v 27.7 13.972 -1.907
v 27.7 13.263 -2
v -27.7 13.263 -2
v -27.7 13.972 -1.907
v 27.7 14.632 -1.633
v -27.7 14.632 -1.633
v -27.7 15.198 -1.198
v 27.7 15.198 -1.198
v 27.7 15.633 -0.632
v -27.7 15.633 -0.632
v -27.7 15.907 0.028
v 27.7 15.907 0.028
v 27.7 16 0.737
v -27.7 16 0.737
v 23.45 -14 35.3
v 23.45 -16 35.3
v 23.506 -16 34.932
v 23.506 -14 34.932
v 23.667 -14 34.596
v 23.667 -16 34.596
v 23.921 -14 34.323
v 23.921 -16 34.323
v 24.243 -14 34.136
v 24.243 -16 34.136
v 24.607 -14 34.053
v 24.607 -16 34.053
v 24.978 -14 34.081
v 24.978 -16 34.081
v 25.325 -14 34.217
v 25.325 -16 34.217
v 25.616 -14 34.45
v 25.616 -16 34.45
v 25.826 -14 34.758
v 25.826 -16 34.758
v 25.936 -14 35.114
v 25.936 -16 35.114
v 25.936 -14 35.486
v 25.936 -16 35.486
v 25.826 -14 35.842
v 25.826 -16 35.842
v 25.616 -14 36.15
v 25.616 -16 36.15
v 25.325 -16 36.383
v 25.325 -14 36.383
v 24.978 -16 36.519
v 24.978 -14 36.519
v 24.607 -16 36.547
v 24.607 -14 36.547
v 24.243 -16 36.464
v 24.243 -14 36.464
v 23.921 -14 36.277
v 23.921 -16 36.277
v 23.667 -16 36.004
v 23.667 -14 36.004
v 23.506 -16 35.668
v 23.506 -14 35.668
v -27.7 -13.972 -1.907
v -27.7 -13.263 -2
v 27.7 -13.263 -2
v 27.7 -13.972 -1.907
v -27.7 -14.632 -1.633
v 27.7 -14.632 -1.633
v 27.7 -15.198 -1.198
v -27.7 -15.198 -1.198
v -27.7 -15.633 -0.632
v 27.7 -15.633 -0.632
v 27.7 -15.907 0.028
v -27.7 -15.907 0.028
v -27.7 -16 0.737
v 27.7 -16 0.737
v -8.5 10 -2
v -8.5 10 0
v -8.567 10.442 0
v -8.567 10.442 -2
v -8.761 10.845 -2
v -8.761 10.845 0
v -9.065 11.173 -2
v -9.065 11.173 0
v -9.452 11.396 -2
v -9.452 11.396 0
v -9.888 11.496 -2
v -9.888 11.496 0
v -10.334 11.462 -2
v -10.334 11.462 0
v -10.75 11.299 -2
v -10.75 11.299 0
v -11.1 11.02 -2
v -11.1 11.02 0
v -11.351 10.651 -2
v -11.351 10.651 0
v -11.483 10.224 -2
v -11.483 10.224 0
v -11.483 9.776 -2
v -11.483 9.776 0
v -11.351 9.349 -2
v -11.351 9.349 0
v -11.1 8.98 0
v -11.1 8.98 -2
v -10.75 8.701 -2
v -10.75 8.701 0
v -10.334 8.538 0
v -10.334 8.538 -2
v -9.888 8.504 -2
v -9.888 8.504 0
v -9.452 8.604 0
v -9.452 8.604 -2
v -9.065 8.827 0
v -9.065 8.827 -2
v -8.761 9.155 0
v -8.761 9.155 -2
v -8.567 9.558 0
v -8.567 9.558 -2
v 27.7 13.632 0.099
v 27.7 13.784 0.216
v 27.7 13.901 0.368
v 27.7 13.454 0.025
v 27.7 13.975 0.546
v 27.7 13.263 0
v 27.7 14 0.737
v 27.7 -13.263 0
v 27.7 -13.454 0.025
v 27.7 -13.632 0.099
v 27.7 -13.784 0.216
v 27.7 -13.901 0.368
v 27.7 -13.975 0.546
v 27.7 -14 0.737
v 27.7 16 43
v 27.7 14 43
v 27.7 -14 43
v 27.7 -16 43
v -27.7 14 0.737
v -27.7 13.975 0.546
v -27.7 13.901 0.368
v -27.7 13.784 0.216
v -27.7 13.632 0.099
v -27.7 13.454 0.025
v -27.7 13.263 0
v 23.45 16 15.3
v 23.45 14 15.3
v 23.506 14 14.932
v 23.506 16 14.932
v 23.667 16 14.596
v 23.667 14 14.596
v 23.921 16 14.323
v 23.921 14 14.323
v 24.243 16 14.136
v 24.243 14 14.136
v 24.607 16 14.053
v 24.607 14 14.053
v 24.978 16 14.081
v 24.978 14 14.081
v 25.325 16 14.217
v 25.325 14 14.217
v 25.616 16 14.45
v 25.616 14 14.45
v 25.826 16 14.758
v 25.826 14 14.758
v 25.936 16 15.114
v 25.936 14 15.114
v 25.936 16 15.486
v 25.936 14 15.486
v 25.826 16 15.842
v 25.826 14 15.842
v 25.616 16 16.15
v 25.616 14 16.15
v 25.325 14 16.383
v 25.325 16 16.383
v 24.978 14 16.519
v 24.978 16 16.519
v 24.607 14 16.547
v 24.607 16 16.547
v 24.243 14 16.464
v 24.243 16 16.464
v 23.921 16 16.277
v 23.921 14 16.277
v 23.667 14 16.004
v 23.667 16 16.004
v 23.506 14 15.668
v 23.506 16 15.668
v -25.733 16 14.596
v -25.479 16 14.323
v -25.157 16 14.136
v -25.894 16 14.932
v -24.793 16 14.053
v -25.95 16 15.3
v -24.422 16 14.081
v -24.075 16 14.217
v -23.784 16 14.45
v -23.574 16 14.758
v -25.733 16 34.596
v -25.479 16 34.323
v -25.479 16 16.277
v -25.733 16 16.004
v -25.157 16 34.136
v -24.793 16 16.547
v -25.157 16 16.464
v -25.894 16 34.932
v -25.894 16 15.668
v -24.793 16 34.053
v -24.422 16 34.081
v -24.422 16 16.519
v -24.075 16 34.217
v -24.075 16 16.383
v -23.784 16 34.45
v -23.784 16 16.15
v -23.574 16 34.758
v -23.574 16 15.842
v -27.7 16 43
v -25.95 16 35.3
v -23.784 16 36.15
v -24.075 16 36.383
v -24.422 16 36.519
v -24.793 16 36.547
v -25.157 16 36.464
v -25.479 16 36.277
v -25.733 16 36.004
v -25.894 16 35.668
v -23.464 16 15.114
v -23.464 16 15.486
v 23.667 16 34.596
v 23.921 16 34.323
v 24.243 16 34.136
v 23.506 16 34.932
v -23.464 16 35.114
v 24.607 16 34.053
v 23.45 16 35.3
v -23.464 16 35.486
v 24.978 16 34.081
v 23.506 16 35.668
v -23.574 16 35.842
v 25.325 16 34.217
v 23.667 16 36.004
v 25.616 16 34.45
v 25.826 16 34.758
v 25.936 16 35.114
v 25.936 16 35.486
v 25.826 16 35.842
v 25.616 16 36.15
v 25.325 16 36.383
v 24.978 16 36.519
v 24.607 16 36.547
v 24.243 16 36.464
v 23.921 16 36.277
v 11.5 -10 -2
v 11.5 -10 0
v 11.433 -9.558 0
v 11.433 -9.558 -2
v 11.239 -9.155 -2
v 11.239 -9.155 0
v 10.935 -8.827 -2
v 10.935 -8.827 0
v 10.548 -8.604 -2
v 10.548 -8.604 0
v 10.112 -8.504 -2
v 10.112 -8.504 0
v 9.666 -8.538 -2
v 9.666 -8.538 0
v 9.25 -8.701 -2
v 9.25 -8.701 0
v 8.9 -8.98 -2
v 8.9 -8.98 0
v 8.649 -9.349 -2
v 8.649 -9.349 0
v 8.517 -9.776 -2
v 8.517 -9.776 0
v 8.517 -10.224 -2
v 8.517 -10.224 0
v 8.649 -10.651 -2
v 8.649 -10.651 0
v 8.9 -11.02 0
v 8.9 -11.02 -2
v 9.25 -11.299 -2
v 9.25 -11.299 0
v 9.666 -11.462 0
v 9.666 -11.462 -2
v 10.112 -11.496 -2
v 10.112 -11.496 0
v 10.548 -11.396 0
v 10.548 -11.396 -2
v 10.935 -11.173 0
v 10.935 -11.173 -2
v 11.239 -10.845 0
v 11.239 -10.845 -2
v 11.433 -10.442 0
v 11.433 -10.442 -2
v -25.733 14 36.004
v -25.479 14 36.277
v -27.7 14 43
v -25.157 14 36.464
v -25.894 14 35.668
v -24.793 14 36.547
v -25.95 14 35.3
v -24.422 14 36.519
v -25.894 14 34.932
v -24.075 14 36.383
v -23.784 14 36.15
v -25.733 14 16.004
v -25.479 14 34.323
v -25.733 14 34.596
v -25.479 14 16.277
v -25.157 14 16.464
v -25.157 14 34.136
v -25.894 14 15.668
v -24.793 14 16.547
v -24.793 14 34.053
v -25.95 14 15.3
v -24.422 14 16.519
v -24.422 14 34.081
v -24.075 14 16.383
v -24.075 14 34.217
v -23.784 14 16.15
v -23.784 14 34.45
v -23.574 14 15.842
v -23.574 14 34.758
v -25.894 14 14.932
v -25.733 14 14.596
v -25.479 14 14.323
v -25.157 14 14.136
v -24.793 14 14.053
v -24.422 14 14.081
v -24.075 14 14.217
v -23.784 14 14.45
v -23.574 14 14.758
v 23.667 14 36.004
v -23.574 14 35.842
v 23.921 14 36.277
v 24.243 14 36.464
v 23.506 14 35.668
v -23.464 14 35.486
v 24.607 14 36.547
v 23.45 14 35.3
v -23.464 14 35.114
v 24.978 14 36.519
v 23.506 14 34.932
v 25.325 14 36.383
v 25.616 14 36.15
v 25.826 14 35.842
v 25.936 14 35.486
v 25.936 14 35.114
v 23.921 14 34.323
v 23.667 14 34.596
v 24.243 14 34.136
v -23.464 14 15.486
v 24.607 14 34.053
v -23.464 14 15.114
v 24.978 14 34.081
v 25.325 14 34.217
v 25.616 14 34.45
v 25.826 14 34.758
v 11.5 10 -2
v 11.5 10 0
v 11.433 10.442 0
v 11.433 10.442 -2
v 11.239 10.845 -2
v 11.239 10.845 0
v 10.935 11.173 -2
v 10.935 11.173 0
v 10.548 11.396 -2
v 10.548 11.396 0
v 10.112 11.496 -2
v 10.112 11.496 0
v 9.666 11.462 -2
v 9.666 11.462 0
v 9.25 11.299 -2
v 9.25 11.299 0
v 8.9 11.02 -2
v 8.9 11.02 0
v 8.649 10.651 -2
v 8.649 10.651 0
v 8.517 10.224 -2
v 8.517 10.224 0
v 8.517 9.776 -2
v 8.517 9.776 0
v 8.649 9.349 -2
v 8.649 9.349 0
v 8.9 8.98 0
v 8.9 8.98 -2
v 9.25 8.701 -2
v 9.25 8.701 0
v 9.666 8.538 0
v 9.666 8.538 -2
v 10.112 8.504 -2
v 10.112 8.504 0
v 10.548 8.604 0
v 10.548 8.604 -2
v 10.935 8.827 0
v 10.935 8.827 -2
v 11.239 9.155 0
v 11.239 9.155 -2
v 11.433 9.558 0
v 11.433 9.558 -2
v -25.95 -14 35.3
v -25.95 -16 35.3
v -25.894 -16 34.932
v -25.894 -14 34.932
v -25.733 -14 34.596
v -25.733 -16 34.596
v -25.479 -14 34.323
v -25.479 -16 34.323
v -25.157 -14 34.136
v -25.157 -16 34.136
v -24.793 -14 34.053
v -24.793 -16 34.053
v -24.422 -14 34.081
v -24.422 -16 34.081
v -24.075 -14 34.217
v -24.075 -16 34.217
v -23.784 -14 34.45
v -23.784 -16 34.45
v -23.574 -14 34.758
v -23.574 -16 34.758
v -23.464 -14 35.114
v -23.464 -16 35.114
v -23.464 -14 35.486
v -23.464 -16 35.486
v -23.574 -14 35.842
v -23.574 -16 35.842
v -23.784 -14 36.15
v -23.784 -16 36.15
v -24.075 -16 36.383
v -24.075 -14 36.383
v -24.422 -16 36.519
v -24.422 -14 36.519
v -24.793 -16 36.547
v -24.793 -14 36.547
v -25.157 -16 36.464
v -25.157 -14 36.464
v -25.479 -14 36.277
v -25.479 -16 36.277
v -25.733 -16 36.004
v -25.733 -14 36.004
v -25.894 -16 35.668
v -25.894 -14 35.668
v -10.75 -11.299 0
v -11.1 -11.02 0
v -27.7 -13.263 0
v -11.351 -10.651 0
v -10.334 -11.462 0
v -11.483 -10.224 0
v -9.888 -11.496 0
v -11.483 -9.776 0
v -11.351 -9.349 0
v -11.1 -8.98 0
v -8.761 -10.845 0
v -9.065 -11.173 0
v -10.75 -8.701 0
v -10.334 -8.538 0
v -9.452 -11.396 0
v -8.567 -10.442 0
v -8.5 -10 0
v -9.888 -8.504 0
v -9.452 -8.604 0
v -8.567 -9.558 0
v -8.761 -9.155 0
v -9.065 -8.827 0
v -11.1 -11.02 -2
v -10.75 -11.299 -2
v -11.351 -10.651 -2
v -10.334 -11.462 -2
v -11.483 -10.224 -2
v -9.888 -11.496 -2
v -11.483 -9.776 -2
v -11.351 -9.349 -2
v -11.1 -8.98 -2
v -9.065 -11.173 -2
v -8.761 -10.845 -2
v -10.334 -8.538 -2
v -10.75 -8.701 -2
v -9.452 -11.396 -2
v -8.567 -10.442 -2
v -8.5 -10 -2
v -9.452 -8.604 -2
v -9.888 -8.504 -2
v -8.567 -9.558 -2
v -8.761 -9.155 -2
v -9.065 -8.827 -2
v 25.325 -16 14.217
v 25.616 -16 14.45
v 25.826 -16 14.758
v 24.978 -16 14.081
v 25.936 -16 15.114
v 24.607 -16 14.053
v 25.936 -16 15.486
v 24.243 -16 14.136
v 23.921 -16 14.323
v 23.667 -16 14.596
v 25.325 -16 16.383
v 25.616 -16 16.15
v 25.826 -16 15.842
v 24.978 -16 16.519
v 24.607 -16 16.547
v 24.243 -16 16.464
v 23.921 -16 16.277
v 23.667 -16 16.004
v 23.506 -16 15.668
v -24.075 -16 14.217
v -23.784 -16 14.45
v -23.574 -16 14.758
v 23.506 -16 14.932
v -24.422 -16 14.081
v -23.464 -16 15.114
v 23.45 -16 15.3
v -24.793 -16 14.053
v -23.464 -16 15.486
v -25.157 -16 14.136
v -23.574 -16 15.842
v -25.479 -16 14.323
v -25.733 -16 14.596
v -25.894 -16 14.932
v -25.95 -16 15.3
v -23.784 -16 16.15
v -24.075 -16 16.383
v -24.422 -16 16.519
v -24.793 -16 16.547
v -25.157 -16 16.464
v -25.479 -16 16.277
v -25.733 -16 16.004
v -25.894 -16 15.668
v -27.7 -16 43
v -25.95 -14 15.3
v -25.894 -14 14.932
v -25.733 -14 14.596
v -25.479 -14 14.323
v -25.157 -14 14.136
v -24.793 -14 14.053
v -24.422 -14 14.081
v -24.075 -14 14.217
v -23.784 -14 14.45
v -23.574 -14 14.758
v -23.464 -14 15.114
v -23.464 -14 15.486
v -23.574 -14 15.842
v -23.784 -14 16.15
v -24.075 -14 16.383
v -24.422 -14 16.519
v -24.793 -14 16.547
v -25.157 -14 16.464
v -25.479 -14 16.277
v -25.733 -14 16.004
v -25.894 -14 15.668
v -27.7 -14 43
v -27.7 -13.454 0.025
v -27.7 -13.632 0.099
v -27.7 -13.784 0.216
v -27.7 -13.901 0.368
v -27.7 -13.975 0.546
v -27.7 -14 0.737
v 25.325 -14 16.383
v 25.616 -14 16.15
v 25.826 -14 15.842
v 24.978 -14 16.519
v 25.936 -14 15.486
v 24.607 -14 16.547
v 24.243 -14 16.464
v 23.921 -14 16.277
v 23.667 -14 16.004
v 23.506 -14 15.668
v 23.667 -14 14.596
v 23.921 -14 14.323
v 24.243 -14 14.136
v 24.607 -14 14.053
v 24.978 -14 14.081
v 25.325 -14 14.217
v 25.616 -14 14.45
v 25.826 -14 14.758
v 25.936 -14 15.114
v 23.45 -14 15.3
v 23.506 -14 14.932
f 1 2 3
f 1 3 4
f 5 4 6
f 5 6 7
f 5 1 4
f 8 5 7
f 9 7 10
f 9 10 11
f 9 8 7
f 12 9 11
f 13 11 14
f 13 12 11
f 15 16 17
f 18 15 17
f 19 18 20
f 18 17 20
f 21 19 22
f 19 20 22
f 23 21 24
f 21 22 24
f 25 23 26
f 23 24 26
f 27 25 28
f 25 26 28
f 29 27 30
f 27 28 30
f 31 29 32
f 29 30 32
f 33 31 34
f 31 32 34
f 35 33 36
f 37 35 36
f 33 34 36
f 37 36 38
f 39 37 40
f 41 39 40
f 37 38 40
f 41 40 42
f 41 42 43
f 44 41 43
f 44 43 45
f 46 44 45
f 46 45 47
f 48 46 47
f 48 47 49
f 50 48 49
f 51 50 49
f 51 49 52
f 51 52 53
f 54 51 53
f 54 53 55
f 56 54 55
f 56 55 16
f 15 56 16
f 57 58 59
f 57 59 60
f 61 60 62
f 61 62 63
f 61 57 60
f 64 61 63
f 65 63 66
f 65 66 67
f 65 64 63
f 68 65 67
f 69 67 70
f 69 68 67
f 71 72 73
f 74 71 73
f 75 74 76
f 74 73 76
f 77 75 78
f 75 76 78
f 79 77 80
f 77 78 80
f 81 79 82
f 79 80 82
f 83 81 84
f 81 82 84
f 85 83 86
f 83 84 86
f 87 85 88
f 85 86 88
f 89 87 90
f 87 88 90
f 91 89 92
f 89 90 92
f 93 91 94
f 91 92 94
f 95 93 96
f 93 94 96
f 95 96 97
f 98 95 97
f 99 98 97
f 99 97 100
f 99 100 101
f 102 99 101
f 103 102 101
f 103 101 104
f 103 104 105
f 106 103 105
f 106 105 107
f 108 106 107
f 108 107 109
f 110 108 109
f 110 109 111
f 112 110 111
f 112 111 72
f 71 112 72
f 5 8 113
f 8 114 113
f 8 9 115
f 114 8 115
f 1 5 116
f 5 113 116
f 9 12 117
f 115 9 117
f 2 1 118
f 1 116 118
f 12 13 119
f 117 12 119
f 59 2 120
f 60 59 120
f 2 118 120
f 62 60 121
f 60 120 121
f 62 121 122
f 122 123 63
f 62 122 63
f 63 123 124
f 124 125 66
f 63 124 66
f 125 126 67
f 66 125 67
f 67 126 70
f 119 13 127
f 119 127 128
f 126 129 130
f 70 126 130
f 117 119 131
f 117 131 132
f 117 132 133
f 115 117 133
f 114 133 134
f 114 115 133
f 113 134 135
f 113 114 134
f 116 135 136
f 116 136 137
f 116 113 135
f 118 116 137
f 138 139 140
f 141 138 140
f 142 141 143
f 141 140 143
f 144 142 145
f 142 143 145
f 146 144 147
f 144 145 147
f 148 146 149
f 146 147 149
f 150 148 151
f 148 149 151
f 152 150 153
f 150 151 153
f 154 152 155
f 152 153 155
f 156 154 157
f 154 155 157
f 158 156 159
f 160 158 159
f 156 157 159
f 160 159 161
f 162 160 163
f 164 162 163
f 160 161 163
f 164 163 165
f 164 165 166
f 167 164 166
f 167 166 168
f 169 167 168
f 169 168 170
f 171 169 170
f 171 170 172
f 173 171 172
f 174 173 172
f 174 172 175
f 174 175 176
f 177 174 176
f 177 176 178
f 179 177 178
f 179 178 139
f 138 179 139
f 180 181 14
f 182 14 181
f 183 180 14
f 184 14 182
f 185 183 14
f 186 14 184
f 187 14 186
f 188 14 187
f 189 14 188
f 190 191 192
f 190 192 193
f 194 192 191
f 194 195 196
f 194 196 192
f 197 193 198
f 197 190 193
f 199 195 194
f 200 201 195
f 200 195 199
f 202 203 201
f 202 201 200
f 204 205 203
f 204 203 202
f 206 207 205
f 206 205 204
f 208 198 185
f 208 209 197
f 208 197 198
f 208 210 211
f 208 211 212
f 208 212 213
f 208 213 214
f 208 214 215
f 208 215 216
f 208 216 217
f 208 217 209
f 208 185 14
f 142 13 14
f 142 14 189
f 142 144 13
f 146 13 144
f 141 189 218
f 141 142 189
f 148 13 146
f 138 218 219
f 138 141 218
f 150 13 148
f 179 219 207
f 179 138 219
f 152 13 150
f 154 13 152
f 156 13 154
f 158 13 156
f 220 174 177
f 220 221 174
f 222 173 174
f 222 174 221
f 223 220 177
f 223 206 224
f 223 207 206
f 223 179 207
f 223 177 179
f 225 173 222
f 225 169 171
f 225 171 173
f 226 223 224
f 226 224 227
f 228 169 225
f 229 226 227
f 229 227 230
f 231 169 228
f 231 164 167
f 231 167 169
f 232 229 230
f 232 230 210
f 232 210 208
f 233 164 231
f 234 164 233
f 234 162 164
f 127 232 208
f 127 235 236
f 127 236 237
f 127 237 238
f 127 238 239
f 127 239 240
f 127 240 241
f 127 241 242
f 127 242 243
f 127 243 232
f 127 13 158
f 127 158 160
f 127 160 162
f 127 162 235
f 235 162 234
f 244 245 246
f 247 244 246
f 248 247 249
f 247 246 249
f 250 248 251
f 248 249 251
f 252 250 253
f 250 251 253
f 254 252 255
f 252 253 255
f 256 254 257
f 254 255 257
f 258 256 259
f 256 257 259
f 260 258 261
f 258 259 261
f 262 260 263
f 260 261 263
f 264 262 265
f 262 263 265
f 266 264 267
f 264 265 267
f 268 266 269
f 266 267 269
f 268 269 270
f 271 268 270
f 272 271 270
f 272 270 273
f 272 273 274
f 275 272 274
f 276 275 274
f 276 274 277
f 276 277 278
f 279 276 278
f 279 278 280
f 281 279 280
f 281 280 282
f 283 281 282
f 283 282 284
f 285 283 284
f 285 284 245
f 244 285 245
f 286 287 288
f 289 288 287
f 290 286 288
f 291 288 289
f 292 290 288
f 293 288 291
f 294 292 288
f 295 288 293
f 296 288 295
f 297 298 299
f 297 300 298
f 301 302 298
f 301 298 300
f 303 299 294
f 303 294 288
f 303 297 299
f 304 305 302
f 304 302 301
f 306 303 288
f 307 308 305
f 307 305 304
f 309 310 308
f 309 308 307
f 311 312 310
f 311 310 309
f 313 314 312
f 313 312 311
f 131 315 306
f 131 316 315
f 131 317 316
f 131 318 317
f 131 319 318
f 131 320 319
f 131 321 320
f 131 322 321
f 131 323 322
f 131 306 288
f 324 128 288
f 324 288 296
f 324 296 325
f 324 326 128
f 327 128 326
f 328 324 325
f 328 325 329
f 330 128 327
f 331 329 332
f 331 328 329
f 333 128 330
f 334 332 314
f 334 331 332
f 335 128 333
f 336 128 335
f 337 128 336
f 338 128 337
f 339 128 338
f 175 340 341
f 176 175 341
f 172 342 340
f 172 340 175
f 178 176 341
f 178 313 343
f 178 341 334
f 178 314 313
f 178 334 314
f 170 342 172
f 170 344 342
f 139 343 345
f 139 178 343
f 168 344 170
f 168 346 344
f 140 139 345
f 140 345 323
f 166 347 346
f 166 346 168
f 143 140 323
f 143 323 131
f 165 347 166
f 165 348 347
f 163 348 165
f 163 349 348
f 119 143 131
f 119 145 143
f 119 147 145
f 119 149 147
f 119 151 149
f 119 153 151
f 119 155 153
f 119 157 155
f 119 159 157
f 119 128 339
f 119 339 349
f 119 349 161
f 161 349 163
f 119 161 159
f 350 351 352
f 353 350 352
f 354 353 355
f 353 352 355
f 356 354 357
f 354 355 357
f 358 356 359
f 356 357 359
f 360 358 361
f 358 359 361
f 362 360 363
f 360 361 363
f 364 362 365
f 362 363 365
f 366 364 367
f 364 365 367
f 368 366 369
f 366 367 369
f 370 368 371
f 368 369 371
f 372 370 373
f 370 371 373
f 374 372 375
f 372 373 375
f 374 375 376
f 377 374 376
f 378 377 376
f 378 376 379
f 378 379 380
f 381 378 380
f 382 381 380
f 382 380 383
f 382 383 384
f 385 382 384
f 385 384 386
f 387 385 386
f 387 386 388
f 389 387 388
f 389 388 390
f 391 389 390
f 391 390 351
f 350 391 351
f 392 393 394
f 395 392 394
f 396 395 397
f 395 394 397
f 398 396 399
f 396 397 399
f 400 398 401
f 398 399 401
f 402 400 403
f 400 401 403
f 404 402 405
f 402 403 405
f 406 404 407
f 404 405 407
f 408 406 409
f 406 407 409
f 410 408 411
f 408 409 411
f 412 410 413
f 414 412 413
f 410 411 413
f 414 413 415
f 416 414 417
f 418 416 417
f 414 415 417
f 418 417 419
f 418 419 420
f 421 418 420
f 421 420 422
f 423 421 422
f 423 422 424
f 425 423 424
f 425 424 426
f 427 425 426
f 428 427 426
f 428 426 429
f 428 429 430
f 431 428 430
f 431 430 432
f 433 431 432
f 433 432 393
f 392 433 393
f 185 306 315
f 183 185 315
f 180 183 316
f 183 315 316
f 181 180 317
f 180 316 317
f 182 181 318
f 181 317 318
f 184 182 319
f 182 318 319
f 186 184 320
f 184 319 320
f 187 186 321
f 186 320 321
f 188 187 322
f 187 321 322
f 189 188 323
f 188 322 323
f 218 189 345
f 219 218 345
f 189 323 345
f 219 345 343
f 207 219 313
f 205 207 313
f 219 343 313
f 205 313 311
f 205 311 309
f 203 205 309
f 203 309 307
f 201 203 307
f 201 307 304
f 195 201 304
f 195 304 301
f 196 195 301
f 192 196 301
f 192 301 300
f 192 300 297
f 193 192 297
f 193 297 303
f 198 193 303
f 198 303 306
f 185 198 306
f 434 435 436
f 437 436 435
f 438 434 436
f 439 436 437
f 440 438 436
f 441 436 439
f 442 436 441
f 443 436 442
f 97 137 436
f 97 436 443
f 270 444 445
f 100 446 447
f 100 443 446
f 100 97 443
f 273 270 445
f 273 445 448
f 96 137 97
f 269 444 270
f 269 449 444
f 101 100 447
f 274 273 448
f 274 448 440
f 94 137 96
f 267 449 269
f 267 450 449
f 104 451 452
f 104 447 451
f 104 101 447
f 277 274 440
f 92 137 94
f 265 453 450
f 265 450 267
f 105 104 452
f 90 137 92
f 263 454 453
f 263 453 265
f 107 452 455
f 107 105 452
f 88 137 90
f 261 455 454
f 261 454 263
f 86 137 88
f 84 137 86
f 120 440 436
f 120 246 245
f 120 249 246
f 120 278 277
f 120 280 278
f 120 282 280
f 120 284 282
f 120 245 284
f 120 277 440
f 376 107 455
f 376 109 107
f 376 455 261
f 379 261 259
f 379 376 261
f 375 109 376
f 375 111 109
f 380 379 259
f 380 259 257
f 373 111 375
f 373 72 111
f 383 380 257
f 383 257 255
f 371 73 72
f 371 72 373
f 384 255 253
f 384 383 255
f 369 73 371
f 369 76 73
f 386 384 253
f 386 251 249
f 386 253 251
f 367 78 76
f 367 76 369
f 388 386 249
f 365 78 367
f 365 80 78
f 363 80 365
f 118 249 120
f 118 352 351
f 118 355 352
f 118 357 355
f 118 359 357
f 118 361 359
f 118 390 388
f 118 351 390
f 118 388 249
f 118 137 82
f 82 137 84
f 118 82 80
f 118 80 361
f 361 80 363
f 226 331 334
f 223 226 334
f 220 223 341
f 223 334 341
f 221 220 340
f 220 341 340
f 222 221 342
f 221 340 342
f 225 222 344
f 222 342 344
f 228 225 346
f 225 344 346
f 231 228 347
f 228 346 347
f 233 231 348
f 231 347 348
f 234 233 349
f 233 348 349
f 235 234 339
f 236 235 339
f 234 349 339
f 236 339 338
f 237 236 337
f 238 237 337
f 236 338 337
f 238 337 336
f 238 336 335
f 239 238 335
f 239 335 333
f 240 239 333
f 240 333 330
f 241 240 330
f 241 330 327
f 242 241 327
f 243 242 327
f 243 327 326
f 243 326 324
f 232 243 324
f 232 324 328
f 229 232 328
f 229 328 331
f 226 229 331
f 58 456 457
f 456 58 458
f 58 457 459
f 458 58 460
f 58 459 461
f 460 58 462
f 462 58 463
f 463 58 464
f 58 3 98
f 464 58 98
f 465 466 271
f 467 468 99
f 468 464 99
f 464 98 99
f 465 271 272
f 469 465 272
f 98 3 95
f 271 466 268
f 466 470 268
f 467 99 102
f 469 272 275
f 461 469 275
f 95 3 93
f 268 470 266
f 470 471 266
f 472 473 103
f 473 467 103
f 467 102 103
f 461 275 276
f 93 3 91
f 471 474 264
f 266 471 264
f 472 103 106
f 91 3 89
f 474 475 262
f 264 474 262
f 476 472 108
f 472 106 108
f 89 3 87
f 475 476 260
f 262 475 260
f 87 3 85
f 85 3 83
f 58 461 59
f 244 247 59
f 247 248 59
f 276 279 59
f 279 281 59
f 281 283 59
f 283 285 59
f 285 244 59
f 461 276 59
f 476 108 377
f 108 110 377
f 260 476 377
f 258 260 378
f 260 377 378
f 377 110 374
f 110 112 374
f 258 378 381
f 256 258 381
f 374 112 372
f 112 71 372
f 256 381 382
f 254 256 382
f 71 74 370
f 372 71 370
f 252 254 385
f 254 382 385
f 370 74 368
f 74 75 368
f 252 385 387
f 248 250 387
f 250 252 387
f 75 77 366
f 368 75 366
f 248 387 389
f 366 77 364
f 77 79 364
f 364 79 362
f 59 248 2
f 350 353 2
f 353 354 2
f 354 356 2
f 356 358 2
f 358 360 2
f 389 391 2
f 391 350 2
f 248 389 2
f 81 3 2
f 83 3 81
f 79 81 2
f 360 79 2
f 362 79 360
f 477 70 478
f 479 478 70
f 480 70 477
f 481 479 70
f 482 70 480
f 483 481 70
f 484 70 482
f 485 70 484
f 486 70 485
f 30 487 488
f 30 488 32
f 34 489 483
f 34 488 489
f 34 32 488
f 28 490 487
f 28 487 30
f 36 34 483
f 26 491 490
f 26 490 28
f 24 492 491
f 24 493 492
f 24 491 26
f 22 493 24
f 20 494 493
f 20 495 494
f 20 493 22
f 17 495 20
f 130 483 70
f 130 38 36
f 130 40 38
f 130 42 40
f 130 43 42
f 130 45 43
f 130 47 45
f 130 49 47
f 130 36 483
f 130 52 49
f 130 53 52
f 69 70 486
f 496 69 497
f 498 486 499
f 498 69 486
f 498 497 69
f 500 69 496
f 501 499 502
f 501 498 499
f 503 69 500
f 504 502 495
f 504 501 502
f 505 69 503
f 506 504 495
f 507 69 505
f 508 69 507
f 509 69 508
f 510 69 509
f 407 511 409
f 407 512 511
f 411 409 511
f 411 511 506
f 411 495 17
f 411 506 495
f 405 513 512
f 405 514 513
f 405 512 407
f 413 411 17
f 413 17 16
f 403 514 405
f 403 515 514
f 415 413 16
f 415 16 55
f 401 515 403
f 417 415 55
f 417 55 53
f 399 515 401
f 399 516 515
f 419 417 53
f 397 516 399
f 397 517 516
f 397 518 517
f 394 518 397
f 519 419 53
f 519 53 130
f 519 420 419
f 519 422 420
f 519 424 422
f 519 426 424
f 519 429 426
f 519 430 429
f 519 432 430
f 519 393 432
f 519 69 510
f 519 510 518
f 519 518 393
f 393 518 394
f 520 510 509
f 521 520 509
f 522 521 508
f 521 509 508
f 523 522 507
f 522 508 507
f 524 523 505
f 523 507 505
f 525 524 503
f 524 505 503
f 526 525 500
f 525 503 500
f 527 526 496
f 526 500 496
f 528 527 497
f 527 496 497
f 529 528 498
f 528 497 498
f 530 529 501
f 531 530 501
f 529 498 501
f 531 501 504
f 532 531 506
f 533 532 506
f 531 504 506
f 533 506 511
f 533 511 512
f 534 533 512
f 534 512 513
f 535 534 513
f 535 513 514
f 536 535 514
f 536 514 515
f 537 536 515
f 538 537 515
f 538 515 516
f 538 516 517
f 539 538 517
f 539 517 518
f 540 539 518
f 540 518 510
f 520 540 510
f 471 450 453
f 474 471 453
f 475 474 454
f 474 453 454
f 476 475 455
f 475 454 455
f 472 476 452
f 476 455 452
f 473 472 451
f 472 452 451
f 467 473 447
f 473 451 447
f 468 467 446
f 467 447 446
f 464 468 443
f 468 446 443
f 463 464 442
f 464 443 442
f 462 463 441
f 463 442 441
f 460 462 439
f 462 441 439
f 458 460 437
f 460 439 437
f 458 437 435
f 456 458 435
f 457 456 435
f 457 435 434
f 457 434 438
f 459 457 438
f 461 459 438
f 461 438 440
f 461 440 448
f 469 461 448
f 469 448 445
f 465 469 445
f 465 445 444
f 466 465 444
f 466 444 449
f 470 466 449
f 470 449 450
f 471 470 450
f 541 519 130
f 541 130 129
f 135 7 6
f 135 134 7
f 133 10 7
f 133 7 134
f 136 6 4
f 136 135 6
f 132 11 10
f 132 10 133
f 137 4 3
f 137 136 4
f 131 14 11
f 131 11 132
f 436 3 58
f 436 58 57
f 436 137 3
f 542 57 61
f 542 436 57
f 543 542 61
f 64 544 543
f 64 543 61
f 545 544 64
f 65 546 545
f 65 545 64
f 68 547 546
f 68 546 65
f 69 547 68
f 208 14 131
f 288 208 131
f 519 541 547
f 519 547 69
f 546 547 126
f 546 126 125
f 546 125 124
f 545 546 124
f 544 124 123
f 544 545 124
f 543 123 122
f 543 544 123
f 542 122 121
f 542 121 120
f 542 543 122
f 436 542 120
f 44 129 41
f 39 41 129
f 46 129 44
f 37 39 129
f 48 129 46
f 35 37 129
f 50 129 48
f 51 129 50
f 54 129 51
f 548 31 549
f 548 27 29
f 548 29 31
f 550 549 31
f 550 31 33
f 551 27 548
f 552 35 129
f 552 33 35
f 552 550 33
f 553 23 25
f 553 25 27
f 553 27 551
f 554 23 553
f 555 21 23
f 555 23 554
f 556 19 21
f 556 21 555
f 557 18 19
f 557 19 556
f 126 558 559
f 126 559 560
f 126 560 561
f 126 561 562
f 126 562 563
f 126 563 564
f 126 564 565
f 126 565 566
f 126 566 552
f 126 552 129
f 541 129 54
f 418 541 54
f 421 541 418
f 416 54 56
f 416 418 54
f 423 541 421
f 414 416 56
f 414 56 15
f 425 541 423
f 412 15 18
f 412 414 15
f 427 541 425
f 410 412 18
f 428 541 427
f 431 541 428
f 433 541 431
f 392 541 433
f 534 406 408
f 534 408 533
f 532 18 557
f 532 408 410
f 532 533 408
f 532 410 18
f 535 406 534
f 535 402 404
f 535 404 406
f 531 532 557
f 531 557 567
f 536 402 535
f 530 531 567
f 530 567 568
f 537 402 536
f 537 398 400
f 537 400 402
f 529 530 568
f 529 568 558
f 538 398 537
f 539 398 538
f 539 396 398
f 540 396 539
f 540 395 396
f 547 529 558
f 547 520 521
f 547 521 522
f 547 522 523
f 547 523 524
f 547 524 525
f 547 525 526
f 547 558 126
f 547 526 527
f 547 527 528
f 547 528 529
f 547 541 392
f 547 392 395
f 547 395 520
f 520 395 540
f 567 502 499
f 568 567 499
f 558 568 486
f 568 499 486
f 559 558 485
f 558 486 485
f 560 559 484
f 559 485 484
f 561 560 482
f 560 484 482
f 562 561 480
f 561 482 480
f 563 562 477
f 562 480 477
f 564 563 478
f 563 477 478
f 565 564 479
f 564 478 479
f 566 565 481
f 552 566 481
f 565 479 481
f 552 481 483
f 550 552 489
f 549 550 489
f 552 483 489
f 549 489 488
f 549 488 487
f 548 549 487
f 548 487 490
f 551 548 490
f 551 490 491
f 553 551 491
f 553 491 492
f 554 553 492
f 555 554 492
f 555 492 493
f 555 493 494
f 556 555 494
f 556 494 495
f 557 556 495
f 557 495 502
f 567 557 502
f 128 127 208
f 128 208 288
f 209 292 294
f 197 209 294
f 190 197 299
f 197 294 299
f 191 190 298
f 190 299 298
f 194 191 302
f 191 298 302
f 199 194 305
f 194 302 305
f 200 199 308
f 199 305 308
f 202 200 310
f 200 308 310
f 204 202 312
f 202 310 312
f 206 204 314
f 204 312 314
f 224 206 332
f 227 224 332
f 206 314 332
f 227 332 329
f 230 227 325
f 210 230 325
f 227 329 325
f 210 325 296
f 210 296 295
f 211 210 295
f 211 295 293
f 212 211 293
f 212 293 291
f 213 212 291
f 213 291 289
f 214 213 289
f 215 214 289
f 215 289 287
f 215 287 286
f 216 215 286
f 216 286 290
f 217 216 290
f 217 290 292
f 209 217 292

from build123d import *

# Parameters (mm, degrees)
SZKIC1_W                             = 55.4
SZKIC1_H                             = 28
ODGI_CIE_BAZOWE1_DEPTH               = 2
OTWORY_USTALAJ_CE_3_0MM1_D           = 3
OTWORY_USTALAJ_CE_3_0MM1_DEPTH       = 17
OTWORY_USTALAJ_CE_3_0MM1_TIP         = 0.901290929
ODGI_CIE_KRAW_DZI1_STRIP_W           = 9.4732
ODGI_CIE_KRAW_DZI1_STRIP_H           = 2
ODGI_CIE_KRAW_DZI1_STRIP_CUT_DEPTH   = 55.4
ODGI_CIE_KRAW_DZI1_STRIP_2_W         = 9.4732
ODGI_CIE_KRAW_DZI1_STRIP_2_H         = 2
ODGI_CIE_KRAW_DZI1_STRIP_CUT_2_DEPTH = 55.4
ODGI_CIE_KRAW_DZI1_DEPTH             = 55.4
ODGI_CIE_KRAW_DZI1_BEND_DEPTH        = 55.4
OTW_R_GWINTOWANY_M3X0_51_D           = 2.5


# Sheet-metal steps are written as plain solids
with BuildPart() as part:
    # Szkic1 → Odgięcie bazowe1 (new body)
    with BuildSketch(Plane.XY):
        Rectangle(SZKIC1_W, SZKIC1_H)
    extrude(amount=-ODGI_CIE_BAZOWE1_DEPTH)

    # Otwory ustalające Ø3.0mm1
    with Locations(Plane(origin=(0, 0, -2), x_dir=(-1, 0, 0), z_dir=(0, 0, -1))):
        with Locations((-10, 10), (10, 10), (10, -10), (-10, -10)):
            Hole(OTWORY_USTALAJ_CE_3_0MM1_D / 2, depth=OTWORY_USTALAJ_CE_3_0MM1_DEPTH)
            with Locations((0, 0, -(OTWORY_USTALAJ_CE_3_0MM1_DEPTH + OTWORY_USTALAJ_CE_3_0MM1_TIP / 2))):  # 118° drill point
                Cone(0, OTWORY_USTALAJ_CE_3_0MM1_D / 2, OTWORY_USTALAJ_CE_3_0MM1_TIP, mode=Mode.SUBTRACT)

    # Odgięcie krawędzi1 strip (across the edge) → Odgięcie krawędzi1 strip cut (cut)
    with BuildSketch(Plane(origin=(27.7, 14, 0), x_dir=(0, -1, 0), z_dir=(-1, 0, 0))):
        with Locations((-4, -1)):
            Rectangle(ODGI_CIE_KRAW_DZI1_STRIP_W, ODGI_CIE_KRAW_DZI1_STRIP_H)
    extrude(amount=ODGI_CIE_KRAW_DZI1_STRIP_CUT_DEPTH, mode=Mode.SUBTRACT)

    # Odgięcie krawędzi1 strip 2 (across the edge) → Odgięcie krawędzi1 strip cut 2 (cut)
    with BuildSketch(Plane(origin=(-27.7, -14, 0), x_dir=(0, 1, 0), z_dir=(1, 0, 0))):
        with Locations((-4, -1)):
            Rectangle(ODGI_CIE_KRAW_DZI1_STRIP_2_W, ODGI_CIE_KRAW_DZI1_STRIP_2_H)
    extrude(amount=ODGI_CIE_KRAW_DZI1_STRIP_CUT_2_DEPTH, mode=Mode.SUBTRACT)

    # Odgięcie krawędzi1 section (across the edge) → Odgięcie krawędzi1 (add)
    with BuildSketch(Plane(origin=(27.7, 14, 0), x_dir=(0, -1, 0), z_dir=(-1, 0, 0))):
        with BuildLine():
            Line((-2, 0.7366), (-2, 43))
            Line((-2, 43), (0, 43))
            Line((0, 43), (0, 0.7366))
            ThreePointArc((0, 0.7366), (0.215745145, 0.215745145), (0.7366, 0))
            Line((0.7366, 0), (0.7366, -2))
            ThreePointArc((0.7366, -2), (-1.198468417, -1.198468417), (-2, 0.7366))
        make_face()
    extrude(amount=ODGI_CIE_KRAW_DZI1_DEPTH)

    # Odgięcie krawędzi1 section 2 (across the edge) → Odgięcie krawędzi1 bend (add)
    with BuildSketch(Plane(origin=(-27.7, -14, 0), x_dir=(0, 1, 0), z_dir=(1, 0, 0))):
        with BuildLine():
            Line((-2, 0.7366), (-2, 43))
            Line((-2, 43), (0, 43))
            Line((0, 43), (0, 0.7366))
            ThreePointArc((0, 0.7366), (0.215745145, 0.215745145), (0.7366, 0))
            Line((0.7366, 0), (0.7366, -2))
            ThreePointArc((0.7366, -2), (-1.198468417, -1.198468417), (-2, 0.7366))
        make_face()
    extrude(amount=ODGI_CIE_KRAW_DZI1_BEND_DEPTH)

    # Otwór gwintowany M3x0.51 (through all)
    with Locations(Plane(origin=(0, 16, 0), x_dir=(1, 0, 0), z_dir=(0, 1, 0))):
        with Locations((-24.7, -35.3), (-24.7, -15.3), (24.7, -35.3), (24.7, -15.3)):
            Hole(OTW_R_GWINTOWANY_M3X0_51_D / 2)


solid = part.part
